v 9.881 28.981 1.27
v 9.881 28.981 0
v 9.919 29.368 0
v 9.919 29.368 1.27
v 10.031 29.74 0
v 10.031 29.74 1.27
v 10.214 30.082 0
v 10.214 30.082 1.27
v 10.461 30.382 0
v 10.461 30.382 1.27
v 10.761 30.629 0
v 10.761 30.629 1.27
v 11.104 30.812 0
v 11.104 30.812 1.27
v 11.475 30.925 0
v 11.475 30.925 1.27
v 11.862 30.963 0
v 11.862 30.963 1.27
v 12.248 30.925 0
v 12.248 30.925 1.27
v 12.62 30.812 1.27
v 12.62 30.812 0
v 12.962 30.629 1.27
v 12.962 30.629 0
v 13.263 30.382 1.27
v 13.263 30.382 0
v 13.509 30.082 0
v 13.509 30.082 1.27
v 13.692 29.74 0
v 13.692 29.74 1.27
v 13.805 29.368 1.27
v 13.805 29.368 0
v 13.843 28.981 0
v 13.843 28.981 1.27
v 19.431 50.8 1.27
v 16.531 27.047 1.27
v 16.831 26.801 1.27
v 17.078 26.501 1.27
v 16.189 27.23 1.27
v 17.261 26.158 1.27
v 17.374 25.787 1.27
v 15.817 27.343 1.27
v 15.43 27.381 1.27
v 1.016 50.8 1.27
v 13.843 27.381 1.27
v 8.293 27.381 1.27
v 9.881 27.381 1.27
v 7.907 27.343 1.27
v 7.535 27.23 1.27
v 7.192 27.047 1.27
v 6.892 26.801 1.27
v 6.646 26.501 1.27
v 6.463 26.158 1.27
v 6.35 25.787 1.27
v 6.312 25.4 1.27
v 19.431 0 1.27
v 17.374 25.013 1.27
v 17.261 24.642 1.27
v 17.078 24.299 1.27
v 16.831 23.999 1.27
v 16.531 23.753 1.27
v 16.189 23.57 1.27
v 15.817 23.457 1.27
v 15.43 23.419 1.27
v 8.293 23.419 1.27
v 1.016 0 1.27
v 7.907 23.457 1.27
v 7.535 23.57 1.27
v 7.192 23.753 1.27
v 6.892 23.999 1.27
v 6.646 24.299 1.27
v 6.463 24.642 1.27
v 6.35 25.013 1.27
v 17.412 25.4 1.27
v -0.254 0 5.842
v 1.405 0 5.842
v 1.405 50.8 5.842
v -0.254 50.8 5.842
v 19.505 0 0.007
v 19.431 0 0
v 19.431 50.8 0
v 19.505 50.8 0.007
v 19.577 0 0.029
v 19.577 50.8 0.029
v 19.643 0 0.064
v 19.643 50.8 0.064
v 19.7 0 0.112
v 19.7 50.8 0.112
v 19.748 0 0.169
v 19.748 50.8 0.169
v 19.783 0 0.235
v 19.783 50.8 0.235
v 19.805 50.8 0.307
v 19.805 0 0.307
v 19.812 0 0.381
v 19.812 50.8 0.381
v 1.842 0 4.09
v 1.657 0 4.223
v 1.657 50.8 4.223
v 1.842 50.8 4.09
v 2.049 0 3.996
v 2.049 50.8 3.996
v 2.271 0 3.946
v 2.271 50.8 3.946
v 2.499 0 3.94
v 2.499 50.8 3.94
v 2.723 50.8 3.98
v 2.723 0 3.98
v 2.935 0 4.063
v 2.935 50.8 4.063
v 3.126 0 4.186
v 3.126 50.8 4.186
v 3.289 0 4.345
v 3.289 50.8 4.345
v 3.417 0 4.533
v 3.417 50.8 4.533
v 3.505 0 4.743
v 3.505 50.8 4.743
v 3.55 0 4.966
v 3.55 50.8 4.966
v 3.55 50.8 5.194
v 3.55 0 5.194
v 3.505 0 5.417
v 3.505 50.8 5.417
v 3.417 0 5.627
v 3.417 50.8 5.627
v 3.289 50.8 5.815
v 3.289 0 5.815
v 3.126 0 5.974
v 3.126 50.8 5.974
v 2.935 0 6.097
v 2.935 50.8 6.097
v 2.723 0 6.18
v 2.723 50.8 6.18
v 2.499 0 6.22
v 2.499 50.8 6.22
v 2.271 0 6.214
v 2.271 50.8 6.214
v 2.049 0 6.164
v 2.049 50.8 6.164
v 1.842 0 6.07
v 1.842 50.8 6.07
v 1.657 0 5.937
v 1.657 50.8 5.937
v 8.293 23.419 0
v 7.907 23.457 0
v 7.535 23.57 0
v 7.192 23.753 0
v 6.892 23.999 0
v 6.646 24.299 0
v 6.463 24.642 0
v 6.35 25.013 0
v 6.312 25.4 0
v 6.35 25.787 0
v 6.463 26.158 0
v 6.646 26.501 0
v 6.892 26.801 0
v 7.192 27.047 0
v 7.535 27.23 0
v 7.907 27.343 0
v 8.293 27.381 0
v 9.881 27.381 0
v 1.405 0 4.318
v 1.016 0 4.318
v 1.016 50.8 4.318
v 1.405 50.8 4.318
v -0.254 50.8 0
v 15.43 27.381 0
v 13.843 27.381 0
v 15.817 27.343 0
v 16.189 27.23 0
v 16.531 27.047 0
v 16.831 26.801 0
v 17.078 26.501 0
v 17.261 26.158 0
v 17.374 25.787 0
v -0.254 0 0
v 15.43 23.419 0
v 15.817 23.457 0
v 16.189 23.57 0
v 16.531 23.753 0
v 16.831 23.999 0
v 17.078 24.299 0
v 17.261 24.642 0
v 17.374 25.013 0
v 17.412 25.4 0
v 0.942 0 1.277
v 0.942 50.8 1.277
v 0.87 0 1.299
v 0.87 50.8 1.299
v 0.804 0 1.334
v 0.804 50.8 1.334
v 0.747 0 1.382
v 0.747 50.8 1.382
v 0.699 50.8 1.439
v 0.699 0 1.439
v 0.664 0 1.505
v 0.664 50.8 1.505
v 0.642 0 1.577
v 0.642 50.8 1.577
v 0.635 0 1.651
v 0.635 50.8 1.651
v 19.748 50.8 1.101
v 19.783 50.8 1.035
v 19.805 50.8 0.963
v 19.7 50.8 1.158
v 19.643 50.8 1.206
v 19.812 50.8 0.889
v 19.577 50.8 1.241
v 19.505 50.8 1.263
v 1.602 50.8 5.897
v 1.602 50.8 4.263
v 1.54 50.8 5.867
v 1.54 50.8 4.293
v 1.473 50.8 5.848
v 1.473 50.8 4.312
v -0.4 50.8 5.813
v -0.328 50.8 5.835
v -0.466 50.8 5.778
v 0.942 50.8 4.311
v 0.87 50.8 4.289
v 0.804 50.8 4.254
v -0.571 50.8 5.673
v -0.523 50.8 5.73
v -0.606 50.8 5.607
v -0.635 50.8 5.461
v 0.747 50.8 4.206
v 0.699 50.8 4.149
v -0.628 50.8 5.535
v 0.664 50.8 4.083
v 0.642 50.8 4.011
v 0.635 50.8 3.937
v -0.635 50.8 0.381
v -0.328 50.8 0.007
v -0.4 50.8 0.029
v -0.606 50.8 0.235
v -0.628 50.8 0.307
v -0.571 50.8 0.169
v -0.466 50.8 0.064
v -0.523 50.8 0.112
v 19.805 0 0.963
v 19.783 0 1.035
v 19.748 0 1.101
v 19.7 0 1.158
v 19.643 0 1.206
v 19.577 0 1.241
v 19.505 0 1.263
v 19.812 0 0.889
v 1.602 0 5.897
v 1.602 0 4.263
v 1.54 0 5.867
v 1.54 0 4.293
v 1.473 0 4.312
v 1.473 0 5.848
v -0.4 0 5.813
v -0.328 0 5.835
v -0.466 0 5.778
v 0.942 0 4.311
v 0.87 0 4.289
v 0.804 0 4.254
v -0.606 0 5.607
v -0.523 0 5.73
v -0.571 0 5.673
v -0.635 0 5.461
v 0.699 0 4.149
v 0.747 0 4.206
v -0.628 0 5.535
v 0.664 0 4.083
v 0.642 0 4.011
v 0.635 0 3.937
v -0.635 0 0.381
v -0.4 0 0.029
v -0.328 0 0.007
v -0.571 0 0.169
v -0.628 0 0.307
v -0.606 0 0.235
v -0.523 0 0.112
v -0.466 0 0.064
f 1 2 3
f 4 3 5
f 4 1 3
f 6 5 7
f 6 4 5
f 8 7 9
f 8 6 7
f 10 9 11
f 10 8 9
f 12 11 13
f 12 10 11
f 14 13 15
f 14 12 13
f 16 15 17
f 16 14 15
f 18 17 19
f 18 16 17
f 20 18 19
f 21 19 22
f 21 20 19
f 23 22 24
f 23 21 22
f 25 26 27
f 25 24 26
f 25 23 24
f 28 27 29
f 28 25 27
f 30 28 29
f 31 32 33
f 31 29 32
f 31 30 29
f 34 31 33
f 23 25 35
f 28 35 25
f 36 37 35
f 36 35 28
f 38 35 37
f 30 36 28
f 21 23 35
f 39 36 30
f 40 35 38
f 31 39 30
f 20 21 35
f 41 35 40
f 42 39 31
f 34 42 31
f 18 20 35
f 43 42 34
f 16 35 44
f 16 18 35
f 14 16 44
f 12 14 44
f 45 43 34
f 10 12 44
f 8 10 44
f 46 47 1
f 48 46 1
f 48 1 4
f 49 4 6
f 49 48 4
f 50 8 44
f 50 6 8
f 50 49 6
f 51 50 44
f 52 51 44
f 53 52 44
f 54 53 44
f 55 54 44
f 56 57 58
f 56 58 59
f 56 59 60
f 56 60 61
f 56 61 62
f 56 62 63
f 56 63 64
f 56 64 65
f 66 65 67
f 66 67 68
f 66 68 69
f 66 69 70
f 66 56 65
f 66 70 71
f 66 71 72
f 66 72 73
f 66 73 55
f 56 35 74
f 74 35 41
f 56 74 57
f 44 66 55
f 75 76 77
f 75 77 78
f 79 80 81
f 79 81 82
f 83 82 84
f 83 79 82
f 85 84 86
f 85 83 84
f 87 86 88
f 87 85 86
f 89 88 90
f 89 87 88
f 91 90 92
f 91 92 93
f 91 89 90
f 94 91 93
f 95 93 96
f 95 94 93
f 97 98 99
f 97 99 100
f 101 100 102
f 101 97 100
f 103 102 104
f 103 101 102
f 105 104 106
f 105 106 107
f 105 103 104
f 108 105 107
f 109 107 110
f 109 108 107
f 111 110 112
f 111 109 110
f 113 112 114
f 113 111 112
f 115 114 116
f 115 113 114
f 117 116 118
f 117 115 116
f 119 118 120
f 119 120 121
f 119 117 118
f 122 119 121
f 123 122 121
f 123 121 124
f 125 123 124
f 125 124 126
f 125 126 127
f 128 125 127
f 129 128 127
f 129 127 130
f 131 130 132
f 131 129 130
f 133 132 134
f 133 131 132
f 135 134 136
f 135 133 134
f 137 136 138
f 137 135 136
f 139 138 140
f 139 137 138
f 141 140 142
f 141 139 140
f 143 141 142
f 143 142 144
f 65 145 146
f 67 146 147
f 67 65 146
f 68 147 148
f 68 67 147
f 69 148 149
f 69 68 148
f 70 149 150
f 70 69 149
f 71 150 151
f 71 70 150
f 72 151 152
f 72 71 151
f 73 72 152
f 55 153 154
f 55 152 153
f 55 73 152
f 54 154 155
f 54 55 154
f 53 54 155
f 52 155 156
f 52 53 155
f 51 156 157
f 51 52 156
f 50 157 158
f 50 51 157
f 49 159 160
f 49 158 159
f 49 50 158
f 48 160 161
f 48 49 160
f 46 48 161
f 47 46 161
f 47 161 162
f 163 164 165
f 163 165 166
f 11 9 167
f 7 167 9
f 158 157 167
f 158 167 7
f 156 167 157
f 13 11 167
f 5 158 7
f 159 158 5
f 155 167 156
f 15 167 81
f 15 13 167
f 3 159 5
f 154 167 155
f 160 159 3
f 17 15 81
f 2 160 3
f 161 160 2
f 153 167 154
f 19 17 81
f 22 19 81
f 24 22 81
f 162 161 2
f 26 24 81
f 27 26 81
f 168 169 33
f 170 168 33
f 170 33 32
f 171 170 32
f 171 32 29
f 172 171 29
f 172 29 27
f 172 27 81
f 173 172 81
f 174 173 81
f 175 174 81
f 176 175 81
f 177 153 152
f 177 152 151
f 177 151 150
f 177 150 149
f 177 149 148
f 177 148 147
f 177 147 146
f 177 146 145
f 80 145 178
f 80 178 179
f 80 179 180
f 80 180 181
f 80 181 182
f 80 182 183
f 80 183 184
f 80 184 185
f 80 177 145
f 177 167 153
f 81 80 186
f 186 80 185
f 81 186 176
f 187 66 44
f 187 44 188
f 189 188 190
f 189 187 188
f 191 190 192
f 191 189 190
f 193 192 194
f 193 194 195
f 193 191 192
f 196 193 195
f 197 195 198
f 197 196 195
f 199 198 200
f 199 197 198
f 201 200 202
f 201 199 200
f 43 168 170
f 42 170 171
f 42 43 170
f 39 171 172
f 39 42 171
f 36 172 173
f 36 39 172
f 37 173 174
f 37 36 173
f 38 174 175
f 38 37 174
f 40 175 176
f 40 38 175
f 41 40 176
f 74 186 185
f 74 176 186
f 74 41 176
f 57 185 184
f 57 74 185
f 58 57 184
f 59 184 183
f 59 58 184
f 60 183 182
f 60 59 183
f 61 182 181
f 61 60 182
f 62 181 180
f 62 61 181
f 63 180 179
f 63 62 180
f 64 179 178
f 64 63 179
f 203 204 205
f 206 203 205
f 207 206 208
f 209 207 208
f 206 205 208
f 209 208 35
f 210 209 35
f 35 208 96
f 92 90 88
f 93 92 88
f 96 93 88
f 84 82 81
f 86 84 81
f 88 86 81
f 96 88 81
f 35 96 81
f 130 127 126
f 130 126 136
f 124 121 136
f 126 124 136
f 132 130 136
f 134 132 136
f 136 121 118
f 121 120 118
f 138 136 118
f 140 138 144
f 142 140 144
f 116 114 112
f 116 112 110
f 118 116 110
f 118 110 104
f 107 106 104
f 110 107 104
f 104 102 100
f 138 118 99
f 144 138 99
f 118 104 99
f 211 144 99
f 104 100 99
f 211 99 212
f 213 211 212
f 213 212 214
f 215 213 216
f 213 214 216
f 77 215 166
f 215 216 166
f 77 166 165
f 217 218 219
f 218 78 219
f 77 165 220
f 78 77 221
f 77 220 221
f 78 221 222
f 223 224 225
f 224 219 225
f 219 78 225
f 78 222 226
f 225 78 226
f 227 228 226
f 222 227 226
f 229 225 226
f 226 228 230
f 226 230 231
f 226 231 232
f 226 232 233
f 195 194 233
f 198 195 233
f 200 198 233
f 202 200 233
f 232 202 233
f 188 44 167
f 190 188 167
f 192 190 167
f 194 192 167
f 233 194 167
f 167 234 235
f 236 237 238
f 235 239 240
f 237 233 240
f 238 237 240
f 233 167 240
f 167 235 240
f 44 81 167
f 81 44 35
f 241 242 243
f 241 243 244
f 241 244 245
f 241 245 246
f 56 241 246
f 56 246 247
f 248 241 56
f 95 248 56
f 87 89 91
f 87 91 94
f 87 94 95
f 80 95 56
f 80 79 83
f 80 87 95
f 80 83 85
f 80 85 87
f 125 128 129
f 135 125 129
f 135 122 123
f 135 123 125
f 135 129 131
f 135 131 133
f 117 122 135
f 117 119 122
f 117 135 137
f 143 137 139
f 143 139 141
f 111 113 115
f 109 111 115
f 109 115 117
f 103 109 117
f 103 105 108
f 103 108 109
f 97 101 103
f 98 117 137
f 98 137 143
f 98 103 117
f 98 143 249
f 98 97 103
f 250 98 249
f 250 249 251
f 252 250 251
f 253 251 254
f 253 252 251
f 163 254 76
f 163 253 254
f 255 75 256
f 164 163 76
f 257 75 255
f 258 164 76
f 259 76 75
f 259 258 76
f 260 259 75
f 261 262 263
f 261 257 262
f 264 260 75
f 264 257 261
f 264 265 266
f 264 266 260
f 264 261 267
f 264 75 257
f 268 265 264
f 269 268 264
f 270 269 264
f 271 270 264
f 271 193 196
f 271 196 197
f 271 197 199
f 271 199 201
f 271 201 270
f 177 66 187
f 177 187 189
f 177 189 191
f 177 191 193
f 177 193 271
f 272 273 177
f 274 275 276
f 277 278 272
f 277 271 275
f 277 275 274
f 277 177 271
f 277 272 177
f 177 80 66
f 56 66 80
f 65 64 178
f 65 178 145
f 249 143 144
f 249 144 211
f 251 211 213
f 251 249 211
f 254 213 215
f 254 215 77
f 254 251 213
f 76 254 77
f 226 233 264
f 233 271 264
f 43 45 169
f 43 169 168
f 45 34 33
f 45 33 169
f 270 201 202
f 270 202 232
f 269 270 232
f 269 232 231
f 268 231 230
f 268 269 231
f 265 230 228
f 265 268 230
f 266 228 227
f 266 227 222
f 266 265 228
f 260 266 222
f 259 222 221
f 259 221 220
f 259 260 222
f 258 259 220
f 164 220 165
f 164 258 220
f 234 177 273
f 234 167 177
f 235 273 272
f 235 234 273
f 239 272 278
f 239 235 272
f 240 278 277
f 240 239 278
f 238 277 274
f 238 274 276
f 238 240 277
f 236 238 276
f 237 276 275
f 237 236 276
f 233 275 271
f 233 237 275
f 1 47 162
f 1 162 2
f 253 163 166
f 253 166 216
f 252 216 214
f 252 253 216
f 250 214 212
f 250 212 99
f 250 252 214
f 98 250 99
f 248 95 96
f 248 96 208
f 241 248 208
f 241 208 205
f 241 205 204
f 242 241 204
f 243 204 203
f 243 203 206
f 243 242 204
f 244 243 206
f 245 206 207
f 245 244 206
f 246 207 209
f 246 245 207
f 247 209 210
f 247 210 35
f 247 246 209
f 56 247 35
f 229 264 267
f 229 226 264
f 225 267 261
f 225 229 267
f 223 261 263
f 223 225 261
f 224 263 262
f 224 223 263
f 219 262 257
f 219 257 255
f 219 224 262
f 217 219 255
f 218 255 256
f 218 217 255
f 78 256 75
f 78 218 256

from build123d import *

# Parameters (mm, degrees)
BOSS_EXTRUDE1_DEPTH = 50.8
SKETCH4_W           = 5.715
SKETCH4_H           = 6.223
CUT_EXTRUDE2_DEPTH  = 51.8
FILLET1_R           = 0.381
CUT_EXTRUDE1_DEPTH  = 2.27


with BuildPart() as part:
    # Sketch2 → Boss-Extrude1 (new body)
    with BuildSketch(Plane(origin=(0, 0, 0), x_dir=(1, 0, 0), z_dir=(0, 1, 0))):
        with BuildLine():
            Line((-5.969, 0), (19.431, 0))
            ThreePointArc((19.431, 0), (19.700407684, -0.111592316), (19.812, -0.381))
            Line((19.812, -0.381), (19.812, -0.889))
            ThreePointArc((19.812, -0.889), (19.700407684, -1.158407684), (19.431, -1.27))
            Line((19.431, -1.27), (1.016, -1.27))
            ThreePointArc((1.016, -1.27), (0.746592316, -1.381592316), (0.635, -1.651))
            Line((0.635, -1.651), (0.635, -3.937))
            ThreePointArc((0.635, -3.937), (0.746592316, -4.206407684), (1.016, -4.318))
            Line((1.016, -4.318), (1.40496875, -4.318))
            ThreePointArc((1.40496875, -4.318), (1.539672592, -4.293392866), (1.656976563, -4.22275))
            ThreePointArc((1.656976563, -4.22275), (3.556, -5.08), (1.656976563, -5.93725))
            ThreePointArc((1.656976563, -5.93725), (1.539672592, -5.866607134), (1.40496875, -5.842))
            Line((1.40496875, -5.842), (-1.40496875, -5.842))
            ThreePointArc((-1.40496875, -5.842), (-1.539672592, -5.866607134), (-1.656976563, -5.93725))
            ThreePointArc((-1.656976563, -5.93725), (-3.556, -5.08), (-1.656976563, -4.22275))
            ThreePointArc((-1.656976563, -4.22275), (-1.539672592, -4.293392866), (-1.40496875, -4.318))
            Line((-1.40496875, -4.318), (-1.016, -4.318))
            ThreePointArc((-1.016, -4.318), (-0.746592316, -4.206407684), (-0.635, -3.937))
            Line((-0.635, -3.937), (-0.635, -1.651))
            ThreePointArc((-0.635, -1.651), (-0.746592316, -1.381592316), (-1.016, -1.27))
            Line((-1.016, -1.27), (-5.969, -1.27))
            ThreePointArc((-5.969, -1.27), (-6.238407684, -1.158407684), (-6.35, -0.889))
            Line((-6.35, -0.889), (-6.35, -0.381))
            ThreePointArc((-6.35, -0.381), (-6.238407684, -0.111592316), (-5.969, 0))
        make_face()
    extrude(amount=BOSS_EXTRUDE1_DEPTH)

    # Sketch4 → Cut-Extrude2 (cut, through all)
    with BuildSketch(Plane.XZ):
        with Locations((-3.4925, 3.1115)):
            Rectangle(SKETCH4_W, SKETCH4_H)
    extrude(amount=-CUT_EXTRUDE2_DEPTH, mode=Mode.SUBTRACT)

    # Fillet1
    fillet1_edges = [part.edges().sort_by_distance(p)[0] for p in [
        (-0.635, 25.4, 5.842),
        (-0.635, 25.4, 0),
    ]]
    fillet(fillet1_edges, radius=FILLET1_R)

    # Sketch3 → Cut-Extrude1 (cut, through all)
    with BuildSketch(Plane.XY.offset(1.27)):
        with BuildLine():
            Line((8.2931, 27.3812), (9.8806, 27.3812))
            Line((9.8806, 27.3812), (9.8806, 28.9814))
            ThreePointArc((9.8806, 28.9814), (11.8618, 30.9626), (13.843, 28.9814))
            Line((13.843, 28.9814), (13.843, 27.3812))
            Line((13.843, 27.3812), (15.4305, 27.3812))
            ThreePointArc((15.4305, 27.3812), (17.4117, 25.4), (15.4305, 23.4188))
            Line((15.4305, 23.4188), (8.2931, 23.4188))
            ThreePointArc((8.2931, 23.4188), (6.3119, 25.4), (8.2931, 27.3812))
        make_face()
    extrude(amount=-CUT_EXTRUDE1_DEPTH, mode=Mode.SUBTRACT)


solid = part.part
